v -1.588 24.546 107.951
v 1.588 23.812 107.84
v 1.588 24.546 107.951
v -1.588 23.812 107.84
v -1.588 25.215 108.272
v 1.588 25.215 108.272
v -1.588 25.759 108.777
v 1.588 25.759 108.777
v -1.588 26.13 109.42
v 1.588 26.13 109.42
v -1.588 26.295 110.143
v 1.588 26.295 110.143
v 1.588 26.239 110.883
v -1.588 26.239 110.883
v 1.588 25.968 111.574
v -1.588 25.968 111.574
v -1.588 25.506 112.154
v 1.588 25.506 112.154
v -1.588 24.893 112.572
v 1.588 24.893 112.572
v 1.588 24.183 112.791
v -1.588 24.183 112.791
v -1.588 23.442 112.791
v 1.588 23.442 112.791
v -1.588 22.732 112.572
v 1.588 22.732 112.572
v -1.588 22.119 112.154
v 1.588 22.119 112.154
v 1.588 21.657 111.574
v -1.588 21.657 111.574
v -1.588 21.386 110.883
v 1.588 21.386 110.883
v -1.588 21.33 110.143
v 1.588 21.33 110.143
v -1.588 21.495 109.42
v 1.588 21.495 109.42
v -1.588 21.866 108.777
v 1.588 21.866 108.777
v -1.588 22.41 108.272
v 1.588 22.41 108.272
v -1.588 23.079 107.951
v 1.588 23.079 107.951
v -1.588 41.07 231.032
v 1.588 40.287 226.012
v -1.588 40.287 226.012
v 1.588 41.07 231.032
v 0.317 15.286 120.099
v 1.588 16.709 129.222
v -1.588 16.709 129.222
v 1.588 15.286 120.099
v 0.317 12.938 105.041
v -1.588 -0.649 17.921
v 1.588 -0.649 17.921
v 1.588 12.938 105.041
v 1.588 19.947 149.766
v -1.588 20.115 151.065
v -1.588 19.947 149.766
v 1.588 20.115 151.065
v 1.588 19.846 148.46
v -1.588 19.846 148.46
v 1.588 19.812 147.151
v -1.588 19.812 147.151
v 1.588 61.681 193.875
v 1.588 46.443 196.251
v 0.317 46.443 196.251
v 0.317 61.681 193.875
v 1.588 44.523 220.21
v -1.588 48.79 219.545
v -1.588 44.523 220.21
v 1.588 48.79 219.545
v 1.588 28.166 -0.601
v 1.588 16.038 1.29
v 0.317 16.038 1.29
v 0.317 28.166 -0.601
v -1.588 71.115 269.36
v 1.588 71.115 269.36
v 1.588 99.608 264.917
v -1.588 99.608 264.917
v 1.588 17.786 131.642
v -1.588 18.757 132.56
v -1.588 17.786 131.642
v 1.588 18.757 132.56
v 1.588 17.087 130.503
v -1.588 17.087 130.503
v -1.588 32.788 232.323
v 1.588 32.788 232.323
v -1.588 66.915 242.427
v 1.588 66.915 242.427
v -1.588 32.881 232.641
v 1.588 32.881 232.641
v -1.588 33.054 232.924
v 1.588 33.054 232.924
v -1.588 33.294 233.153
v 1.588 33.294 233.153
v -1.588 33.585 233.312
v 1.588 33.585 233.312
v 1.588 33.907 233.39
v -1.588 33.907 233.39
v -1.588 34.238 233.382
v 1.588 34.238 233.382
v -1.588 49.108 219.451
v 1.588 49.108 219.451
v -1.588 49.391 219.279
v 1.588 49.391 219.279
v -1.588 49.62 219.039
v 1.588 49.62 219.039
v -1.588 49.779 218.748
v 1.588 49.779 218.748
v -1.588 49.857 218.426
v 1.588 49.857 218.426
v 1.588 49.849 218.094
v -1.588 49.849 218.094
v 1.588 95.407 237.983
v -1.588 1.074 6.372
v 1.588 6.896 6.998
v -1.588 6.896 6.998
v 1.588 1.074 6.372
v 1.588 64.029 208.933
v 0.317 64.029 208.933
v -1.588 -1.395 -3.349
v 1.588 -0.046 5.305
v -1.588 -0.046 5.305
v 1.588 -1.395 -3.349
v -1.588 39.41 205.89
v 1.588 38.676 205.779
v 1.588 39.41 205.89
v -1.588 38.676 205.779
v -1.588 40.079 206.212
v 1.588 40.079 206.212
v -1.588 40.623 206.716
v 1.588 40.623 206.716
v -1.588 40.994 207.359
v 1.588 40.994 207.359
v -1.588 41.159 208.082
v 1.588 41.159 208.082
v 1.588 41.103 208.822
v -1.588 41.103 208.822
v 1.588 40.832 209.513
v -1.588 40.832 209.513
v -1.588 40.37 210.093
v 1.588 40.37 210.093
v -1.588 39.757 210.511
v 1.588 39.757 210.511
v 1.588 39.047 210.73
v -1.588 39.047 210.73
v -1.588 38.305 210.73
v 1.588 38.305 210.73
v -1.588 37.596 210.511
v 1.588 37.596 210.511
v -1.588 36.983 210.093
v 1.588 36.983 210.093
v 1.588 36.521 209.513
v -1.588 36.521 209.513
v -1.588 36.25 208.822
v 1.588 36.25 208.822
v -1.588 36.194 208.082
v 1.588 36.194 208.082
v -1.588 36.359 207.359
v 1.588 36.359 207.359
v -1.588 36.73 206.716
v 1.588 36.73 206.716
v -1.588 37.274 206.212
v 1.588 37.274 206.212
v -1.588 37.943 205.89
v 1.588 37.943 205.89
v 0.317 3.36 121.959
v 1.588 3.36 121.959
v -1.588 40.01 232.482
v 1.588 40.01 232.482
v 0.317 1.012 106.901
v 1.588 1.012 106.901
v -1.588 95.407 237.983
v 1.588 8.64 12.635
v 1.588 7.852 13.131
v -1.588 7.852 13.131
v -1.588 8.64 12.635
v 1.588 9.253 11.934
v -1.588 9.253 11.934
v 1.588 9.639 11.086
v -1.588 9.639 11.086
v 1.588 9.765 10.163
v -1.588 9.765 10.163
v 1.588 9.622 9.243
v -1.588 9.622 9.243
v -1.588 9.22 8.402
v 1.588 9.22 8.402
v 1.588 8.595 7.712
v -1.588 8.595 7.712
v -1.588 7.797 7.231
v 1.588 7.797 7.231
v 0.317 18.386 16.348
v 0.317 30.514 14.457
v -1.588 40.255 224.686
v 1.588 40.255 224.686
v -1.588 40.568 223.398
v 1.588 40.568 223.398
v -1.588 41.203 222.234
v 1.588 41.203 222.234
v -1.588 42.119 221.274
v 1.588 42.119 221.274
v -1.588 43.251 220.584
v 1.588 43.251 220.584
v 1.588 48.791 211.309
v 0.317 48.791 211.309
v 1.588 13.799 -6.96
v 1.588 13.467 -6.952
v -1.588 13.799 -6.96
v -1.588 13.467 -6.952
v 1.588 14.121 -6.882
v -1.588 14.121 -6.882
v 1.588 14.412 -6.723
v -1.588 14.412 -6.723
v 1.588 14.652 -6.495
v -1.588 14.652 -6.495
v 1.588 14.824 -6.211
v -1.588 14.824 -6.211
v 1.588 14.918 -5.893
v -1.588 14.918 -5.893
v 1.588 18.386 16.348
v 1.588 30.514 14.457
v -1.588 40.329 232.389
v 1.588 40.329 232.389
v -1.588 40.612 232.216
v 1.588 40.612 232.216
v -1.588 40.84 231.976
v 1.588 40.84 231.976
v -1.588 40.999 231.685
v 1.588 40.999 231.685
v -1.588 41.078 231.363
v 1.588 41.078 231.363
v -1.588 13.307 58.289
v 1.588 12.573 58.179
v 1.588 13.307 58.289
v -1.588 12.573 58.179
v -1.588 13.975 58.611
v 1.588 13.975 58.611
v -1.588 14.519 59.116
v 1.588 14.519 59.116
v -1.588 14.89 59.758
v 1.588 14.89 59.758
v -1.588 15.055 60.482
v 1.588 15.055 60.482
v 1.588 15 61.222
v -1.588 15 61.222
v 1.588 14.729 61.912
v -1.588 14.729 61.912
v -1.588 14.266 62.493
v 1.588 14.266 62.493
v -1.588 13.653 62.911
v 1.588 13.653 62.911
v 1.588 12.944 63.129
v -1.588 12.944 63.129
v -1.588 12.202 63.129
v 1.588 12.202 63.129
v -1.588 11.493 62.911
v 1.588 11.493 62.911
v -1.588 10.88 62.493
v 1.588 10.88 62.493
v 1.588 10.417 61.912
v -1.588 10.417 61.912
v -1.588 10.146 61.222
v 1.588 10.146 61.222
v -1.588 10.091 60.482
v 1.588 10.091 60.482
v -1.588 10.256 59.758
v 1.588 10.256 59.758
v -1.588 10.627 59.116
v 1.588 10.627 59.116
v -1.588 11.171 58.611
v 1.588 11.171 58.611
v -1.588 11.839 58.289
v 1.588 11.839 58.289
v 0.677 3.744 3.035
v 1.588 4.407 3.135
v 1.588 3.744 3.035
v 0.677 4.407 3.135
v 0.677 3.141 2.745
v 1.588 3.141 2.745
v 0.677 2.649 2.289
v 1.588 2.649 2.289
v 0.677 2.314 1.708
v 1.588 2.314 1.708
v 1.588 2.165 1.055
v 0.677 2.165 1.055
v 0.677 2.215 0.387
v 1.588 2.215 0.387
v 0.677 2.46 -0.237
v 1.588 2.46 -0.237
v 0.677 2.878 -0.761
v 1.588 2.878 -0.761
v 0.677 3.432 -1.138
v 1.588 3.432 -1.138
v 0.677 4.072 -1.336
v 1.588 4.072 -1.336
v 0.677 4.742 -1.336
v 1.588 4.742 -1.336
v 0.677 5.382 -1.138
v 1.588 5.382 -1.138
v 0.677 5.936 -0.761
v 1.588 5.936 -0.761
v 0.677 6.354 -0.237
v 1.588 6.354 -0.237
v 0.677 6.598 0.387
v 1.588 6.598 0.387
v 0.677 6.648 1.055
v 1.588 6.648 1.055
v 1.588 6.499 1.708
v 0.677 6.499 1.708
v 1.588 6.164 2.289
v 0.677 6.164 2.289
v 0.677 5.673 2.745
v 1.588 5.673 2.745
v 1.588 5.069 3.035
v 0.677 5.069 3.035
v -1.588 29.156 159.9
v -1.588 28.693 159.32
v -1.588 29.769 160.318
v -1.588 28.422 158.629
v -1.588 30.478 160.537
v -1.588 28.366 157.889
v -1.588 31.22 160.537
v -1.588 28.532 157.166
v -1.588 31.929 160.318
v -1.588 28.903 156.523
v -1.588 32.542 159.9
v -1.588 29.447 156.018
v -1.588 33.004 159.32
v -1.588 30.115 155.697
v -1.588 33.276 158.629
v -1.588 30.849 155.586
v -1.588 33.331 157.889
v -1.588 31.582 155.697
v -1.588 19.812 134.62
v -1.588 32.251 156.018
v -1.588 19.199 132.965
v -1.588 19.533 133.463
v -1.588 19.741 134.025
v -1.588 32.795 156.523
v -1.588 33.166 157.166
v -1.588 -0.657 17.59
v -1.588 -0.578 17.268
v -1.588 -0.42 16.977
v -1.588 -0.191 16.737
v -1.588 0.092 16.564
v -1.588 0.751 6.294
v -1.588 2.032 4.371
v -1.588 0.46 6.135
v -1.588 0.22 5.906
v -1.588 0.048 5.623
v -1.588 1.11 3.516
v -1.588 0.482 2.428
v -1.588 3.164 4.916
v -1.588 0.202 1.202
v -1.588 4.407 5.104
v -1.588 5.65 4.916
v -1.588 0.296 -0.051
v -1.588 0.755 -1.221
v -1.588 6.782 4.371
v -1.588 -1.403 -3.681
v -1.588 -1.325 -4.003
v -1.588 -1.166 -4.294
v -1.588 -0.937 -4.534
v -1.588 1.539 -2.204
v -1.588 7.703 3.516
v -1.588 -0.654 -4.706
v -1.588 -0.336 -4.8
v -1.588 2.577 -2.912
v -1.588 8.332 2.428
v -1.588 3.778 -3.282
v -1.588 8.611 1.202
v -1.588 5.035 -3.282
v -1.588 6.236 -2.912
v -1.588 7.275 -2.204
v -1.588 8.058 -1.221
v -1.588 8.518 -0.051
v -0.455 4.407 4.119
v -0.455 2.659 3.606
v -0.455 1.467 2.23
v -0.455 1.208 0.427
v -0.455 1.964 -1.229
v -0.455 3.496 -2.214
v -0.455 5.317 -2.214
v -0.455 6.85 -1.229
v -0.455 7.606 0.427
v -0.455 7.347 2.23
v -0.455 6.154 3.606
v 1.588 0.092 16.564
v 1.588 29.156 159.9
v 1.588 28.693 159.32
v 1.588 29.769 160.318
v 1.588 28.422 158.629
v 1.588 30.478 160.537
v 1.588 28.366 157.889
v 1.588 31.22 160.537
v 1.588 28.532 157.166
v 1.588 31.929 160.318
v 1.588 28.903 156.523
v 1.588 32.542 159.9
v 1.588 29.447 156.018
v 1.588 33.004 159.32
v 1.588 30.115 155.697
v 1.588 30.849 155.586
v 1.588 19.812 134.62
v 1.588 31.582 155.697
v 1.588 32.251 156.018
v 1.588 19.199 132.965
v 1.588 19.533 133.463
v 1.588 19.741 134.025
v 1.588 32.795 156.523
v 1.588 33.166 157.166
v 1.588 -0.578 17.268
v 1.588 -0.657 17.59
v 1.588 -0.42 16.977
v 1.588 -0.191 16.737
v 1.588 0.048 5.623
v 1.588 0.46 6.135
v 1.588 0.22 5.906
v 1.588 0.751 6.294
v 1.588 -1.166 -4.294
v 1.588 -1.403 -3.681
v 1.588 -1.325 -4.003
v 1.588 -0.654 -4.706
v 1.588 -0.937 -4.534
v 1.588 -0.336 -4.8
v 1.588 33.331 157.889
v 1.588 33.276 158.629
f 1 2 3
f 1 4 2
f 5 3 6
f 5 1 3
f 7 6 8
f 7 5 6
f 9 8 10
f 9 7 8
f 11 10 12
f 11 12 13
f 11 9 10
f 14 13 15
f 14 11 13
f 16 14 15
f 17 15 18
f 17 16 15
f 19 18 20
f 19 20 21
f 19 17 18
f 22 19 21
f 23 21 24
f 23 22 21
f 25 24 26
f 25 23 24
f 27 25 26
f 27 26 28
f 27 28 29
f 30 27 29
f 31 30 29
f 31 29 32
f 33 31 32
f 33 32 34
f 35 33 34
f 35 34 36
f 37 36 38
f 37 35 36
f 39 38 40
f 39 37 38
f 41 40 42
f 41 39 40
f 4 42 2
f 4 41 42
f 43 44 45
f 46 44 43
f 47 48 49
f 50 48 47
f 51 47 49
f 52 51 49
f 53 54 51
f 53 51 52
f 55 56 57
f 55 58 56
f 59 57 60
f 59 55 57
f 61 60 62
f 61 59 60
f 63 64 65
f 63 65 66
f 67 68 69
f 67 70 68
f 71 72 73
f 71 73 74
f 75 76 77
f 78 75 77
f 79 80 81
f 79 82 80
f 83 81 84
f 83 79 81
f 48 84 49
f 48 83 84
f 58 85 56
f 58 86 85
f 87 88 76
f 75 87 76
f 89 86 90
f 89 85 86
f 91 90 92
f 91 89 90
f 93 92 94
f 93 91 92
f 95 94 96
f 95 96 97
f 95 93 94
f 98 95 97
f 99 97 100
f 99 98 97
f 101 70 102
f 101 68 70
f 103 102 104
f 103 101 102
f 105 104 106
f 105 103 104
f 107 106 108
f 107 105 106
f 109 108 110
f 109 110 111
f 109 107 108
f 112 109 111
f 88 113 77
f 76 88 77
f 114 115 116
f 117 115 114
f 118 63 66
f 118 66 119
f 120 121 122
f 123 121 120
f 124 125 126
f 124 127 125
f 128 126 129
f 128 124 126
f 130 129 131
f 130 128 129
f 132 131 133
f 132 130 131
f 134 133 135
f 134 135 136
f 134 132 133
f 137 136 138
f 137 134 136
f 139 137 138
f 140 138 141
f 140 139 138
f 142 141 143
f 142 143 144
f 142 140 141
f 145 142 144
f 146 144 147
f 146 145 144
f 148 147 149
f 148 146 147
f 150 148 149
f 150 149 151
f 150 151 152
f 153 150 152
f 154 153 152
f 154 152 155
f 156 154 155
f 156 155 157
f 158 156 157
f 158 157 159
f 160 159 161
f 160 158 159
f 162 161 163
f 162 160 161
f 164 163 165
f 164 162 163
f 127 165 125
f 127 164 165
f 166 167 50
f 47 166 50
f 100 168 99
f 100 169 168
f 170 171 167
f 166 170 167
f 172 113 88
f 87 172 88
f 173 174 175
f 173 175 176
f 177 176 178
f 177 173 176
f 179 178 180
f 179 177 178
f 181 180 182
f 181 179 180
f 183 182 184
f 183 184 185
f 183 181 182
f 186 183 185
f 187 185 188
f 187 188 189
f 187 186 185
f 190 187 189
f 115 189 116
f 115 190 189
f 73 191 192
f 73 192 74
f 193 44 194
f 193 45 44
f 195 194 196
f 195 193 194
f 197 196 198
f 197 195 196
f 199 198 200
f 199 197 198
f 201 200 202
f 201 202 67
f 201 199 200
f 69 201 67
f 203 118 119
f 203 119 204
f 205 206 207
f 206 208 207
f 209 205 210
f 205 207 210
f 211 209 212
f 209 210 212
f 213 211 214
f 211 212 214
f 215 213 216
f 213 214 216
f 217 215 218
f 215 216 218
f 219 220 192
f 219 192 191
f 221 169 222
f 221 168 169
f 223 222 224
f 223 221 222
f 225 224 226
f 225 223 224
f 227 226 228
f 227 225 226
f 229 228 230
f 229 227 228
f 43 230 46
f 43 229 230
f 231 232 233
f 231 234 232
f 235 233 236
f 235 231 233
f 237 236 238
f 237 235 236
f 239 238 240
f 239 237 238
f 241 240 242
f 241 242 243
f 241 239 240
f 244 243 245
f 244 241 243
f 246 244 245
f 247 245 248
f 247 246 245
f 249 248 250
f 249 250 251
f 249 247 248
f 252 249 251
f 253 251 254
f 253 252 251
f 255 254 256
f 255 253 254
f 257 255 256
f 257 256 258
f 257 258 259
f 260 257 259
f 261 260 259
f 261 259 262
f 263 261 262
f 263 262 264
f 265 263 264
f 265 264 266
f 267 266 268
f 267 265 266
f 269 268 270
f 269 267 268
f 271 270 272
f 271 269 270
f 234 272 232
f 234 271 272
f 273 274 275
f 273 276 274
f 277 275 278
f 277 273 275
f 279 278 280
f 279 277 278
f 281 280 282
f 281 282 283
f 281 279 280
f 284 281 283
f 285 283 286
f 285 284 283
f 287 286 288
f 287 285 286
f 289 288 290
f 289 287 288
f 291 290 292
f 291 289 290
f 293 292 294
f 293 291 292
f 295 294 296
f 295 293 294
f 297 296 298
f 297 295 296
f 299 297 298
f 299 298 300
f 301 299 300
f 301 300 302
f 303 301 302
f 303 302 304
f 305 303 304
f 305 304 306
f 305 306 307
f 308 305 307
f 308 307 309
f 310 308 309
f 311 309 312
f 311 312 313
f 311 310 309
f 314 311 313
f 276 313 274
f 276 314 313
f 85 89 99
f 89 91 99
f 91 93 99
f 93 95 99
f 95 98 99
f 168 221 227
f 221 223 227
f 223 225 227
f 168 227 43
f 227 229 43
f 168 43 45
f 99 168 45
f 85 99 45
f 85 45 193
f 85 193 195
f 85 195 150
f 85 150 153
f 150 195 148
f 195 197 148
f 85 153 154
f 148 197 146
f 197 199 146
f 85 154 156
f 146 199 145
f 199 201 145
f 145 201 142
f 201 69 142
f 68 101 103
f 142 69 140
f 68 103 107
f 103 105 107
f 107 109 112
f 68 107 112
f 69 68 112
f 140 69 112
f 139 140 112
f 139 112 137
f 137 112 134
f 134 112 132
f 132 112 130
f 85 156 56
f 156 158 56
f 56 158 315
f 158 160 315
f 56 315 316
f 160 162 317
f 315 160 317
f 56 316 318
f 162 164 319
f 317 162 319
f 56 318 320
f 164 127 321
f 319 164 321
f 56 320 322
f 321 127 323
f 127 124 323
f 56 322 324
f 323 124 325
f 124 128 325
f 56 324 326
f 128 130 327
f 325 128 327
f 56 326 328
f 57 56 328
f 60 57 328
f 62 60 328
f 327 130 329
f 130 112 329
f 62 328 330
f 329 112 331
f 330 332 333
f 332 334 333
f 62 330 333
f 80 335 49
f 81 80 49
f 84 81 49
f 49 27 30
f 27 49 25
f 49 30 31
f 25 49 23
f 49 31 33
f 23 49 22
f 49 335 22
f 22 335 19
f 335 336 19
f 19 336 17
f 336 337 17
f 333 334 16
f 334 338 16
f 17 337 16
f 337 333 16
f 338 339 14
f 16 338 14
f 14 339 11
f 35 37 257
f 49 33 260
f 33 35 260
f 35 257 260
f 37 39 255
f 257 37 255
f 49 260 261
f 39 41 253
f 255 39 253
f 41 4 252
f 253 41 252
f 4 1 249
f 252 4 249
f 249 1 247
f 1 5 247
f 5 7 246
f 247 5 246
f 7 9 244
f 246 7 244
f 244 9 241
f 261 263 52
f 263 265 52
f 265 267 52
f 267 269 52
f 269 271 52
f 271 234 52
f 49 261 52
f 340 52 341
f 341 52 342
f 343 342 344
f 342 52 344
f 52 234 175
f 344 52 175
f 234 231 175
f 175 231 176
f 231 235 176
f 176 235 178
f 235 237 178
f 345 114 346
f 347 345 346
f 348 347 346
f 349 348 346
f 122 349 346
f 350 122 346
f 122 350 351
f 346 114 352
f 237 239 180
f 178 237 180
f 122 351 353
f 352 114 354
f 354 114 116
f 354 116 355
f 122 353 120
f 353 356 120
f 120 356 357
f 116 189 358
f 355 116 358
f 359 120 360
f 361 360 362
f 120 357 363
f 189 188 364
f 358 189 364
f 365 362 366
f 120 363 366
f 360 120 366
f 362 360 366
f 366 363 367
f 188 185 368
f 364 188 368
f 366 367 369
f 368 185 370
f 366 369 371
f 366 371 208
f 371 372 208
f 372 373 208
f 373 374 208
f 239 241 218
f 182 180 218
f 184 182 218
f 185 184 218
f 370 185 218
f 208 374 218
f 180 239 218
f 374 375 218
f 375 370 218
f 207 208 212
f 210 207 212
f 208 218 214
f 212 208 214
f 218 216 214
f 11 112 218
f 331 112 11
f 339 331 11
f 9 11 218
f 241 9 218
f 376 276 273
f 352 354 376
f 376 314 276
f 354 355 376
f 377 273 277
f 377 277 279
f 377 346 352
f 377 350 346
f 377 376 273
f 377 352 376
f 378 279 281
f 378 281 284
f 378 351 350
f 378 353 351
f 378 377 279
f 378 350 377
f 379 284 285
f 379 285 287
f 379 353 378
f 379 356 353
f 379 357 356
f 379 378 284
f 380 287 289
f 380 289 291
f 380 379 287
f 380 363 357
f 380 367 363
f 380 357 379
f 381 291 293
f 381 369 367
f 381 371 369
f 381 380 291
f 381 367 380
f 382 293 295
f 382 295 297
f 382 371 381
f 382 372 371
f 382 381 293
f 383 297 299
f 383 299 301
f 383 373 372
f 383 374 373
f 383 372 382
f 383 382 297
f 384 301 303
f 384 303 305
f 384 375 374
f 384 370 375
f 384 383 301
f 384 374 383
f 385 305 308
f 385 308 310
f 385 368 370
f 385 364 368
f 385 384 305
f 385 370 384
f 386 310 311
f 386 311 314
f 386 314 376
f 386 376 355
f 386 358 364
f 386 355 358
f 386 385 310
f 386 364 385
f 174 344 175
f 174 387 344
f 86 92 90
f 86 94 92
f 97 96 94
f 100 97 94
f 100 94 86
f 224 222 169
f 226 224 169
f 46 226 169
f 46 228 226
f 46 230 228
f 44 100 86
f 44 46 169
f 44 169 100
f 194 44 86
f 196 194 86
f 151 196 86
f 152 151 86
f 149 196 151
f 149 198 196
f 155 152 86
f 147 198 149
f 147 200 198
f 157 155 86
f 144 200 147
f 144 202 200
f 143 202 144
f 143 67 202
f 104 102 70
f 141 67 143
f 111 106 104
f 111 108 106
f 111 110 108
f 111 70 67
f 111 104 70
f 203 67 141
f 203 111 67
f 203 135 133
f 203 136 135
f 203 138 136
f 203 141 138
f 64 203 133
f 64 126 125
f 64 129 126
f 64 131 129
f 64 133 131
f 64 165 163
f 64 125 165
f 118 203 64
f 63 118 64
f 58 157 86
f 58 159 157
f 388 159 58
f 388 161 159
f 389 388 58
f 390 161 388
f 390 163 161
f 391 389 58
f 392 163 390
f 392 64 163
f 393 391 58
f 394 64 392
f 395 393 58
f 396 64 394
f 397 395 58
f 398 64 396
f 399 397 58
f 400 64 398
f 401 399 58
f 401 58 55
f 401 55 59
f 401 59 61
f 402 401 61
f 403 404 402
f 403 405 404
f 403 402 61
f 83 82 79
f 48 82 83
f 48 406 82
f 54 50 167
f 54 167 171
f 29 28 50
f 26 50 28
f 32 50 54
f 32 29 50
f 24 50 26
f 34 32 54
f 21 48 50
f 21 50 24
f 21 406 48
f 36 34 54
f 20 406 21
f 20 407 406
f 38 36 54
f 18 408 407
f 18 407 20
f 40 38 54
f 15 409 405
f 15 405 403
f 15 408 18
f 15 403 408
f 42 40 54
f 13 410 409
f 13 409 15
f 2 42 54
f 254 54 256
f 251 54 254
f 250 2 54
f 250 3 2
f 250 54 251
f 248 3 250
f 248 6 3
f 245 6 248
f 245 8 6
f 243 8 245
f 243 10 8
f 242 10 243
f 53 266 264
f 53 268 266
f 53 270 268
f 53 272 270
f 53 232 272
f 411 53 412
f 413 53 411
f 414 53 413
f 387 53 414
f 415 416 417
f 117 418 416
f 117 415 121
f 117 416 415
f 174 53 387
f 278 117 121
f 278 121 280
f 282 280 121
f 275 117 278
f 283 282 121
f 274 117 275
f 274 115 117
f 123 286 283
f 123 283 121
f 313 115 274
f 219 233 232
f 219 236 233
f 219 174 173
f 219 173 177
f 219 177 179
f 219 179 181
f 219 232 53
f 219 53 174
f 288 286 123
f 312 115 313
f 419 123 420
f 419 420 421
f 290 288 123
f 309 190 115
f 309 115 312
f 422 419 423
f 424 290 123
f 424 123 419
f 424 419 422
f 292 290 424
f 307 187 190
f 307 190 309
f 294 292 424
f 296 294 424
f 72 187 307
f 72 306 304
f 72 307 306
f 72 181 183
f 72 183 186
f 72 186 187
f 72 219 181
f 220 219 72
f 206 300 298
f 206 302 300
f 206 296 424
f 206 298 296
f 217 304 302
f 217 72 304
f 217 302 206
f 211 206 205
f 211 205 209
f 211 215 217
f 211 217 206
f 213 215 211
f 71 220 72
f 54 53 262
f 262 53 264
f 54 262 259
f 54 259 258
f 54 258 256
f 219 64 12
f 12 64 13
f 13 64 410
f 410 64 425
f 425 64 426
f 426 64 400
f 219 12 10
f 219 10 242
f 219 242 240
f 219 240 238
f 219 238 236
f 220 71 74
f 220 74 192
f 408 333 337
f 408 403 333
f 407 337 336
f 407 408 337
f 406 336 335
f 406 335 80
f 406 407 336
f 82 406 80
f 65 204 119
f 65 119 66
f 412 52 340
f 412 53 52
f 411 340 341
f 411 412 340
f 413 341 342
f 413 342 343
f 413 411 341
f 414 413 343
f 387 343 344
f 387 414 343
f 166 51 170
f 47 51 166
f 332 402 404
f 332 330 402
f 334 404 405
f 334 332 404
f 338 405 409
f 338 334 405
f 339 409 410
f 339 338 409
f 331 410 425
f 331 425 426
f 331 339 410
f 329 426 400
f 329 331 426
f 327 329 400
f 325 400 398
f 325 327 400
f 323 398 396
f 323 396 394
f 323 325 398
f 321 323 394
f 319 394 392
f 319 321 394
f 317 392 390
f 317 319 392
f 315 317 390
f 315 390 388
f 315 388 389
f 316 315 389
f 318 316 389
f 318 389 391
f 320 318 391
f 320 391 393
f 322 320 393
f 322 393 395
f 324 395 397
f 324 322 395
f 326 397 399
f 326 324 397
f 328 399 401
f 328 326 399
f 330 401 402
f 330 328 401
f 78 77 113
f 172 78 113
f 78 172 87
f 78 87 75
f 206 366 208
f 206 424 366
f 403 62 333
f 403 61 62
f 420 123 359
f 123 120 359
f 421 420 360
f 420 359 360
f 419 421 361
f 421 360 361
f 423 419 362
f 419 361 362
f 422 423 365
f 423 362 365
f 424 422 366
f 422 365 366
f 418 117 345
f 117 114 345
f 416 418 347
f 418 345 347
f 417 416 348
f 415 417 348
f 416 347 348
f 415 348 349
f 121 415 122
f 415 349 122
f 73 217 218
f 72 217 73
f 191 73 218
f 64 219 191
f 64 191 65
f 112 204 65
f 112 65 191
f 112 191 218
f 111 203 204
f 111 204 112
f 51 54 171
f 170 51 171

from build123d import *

# Parameters (mm, degrees)
SKETCH1_R           = 2.4892
BOSS_EXTRUDE1_DEPTH = 1.5875
FILLET1_R           = 5.08
FILLET2_R           = 25.4
FILLET3_R           = 5.08
FILLET4_R           = 1.27
BOSS_EXTRUDE2_DEPTH = 1.27
BOSS_EXTRUDE3_DEPTH = 3.175


with BuildPart() as part:
    # Sketch1 → Boss-Extrude1 (new, symmetric)
    with BuildSketch(Plane(origin=(0, 0, 0), x_dir=(0, 0, -1), z_dir=(1, 0, 0))):
        with BuildLine():
            Line((-233.577951119, 32.983434854), (-149.119868942, 19.812))
            Line((-149.119868942, 19.812), (-134.62, 19.812))
            ThreePointArc((-134.62, 19.812), (-132.783053242, 19.026202556), (-132.082695513, 17.155013077))
            Line((-132.082695513, 17.155013077), (-16.958288608, -0.798906627))
            Line((-16.958288608, -0.798906627), (-13.131238228, 7.851990013))
            ThreePointArc((-13.131238228, 7.851990013), (-9.697725885, 9.726800552), (-6.99813958, 6.895518978))
            Line((-6.99813958, 6.895518978), (-6.268088645, 0.104634039))
            Line((-6.268088645, 0.104634039), (4.604139182, -1.590915242))
            Line((4.604139182, -1.590915242), (7.148161285, 14.721903384))
            Line((7.148161285, 14.721903384), (-219.349051182, 50.044671814))
            Line((-219.349051182, 50.044671814), (-220.992880849, 39.504081317))
            Line((-220.992880849, 39.504081317), (-232.286370667, 41.265327388))
            Line((-232.286370667, 41.265327388), (-233.577951119, 32.983434854))
        make_face()
        with Locations((-110.329119322, 23.8125)):
            Circle(SKETCH1_R, mode=Mode.SUBTRACT)
        with Locations((-60.6679, 12.573)):
            Circle(SKETCH1_R, mode=Mode.SUBTRACT)
        with Locations((-208.268434221, 38.676490219)):
            Circle(SKETCH1_R, mode=Mode.SUBTRACT)
        with Locations((-158.07514614, 30.848729903)):
            Circle(SKETCH1_R, mode=Mode.SUBTRACT)
    extrude(amount=BOSS_EXTRUDE1_DEPTH, both=True)

    # Fillet1
    fillet1_edges = [part.edges().sort_by_distance(p)[0] for p in [
        (0, 39.504081317, 220.992880849),
    ]]
    fillet(fillet1_edges, radius=FILLET1_R)

    # Fillet2
    fillet2_edges = [part.edges().sort_by_distance(p)[0] for p in [
        (0, 19.812, 149.119868942),
    ]]
    fillet(fillet2_edges, radius=FILLET2_R)

    # Fillet3
    fillet3_edges = [part.edges().sort_by_distance(p)[0] for p in [
        (0, 17.155013077, 132.082695513),
    ]]
    fillet(fillet3_edges, radius=FILLET3_R)

    # Fillet4
    fillet4_edges = [part.edges().sort_by_distance(p)[0] for p in [
        (0, 41.265327388, 232.286370667),
        (0, 50.044671814, 219.349051182),
        (0, 14.721903384, -7.148161285),
        (0, -1.590915242, -4.604139182),
        (0, 0.104634039, 6.268088645),
        (0, -0.798906627, 16.958288608),
        (0, 32.983434854, 233.577951119),
    ]]
    fillet(fillet4_edges, radius=FILLET4_R)

    # Sketch3 → CSK for #8 Oval Head Machine Screw1 (revolve, cut)
    with BuildSketch(Plane(origin=(-1.5875, 4.406883606, 0.887245796), x_dir=(0, 0, 1), z_dir=(0, 1, 0))):
        Polygon((0, 0), (0, 3.175), (2.2479, 3.175), (2.2479, 2.26450021), (4.2164, 0), align=None)
    revolve(axis=Axis((-7.9375, 4.406883606, 0.887245796), (1, 0, 0)), mode=Mode.SUBTRACT)

    # Sketch5 → Boss-Extrude2 (add)
    with BuildSketch(Plane(origin=(1.5875, 0, 0), x_dir=(0, 0, -1), z_dir=(1, 0, 0))):
        Polygon((-211.309449187, 48.790877136), (-196.251462762, 46.442549041), (-193.874976982, 61.681088617), (-208.932963407, 64.029416712), align=None)
        Polygon((-16.348177372, 18.386212187), (-1.290190948, 16.037884092), (0.601235673, 28.166119681), (-14.456750751, 30.514447776), align=None)
        Polygon((-120.099402783, 15.286190633), (-105.041416359, 12.937862538), (-106.901320308, 1.01175712), (-121.959306732, 3.360085215), align=None)
    extrude(amount=-BOSS_EXTRUDE2_DEPTH)


with BuildPart() as body_2:
    # Sketch6 → Boss-Extrude3 (new body)
    with BuildSketch(Plane(origin=(1.5875, 0, 0), x_dir=(0, 0, -1), z_dir=(1, 0, 0))):
        Polygon((-237.983488244, 95.40736612), (-242.42694337, 66.914973125), (-269.360010559, 71.115247756), (-264.916555433, 99.60764075), align=None)
    extrude(amount=-BOSS_EXTRUDE3_DEPTH)


solid = Compound([part.part, body_2.part])
